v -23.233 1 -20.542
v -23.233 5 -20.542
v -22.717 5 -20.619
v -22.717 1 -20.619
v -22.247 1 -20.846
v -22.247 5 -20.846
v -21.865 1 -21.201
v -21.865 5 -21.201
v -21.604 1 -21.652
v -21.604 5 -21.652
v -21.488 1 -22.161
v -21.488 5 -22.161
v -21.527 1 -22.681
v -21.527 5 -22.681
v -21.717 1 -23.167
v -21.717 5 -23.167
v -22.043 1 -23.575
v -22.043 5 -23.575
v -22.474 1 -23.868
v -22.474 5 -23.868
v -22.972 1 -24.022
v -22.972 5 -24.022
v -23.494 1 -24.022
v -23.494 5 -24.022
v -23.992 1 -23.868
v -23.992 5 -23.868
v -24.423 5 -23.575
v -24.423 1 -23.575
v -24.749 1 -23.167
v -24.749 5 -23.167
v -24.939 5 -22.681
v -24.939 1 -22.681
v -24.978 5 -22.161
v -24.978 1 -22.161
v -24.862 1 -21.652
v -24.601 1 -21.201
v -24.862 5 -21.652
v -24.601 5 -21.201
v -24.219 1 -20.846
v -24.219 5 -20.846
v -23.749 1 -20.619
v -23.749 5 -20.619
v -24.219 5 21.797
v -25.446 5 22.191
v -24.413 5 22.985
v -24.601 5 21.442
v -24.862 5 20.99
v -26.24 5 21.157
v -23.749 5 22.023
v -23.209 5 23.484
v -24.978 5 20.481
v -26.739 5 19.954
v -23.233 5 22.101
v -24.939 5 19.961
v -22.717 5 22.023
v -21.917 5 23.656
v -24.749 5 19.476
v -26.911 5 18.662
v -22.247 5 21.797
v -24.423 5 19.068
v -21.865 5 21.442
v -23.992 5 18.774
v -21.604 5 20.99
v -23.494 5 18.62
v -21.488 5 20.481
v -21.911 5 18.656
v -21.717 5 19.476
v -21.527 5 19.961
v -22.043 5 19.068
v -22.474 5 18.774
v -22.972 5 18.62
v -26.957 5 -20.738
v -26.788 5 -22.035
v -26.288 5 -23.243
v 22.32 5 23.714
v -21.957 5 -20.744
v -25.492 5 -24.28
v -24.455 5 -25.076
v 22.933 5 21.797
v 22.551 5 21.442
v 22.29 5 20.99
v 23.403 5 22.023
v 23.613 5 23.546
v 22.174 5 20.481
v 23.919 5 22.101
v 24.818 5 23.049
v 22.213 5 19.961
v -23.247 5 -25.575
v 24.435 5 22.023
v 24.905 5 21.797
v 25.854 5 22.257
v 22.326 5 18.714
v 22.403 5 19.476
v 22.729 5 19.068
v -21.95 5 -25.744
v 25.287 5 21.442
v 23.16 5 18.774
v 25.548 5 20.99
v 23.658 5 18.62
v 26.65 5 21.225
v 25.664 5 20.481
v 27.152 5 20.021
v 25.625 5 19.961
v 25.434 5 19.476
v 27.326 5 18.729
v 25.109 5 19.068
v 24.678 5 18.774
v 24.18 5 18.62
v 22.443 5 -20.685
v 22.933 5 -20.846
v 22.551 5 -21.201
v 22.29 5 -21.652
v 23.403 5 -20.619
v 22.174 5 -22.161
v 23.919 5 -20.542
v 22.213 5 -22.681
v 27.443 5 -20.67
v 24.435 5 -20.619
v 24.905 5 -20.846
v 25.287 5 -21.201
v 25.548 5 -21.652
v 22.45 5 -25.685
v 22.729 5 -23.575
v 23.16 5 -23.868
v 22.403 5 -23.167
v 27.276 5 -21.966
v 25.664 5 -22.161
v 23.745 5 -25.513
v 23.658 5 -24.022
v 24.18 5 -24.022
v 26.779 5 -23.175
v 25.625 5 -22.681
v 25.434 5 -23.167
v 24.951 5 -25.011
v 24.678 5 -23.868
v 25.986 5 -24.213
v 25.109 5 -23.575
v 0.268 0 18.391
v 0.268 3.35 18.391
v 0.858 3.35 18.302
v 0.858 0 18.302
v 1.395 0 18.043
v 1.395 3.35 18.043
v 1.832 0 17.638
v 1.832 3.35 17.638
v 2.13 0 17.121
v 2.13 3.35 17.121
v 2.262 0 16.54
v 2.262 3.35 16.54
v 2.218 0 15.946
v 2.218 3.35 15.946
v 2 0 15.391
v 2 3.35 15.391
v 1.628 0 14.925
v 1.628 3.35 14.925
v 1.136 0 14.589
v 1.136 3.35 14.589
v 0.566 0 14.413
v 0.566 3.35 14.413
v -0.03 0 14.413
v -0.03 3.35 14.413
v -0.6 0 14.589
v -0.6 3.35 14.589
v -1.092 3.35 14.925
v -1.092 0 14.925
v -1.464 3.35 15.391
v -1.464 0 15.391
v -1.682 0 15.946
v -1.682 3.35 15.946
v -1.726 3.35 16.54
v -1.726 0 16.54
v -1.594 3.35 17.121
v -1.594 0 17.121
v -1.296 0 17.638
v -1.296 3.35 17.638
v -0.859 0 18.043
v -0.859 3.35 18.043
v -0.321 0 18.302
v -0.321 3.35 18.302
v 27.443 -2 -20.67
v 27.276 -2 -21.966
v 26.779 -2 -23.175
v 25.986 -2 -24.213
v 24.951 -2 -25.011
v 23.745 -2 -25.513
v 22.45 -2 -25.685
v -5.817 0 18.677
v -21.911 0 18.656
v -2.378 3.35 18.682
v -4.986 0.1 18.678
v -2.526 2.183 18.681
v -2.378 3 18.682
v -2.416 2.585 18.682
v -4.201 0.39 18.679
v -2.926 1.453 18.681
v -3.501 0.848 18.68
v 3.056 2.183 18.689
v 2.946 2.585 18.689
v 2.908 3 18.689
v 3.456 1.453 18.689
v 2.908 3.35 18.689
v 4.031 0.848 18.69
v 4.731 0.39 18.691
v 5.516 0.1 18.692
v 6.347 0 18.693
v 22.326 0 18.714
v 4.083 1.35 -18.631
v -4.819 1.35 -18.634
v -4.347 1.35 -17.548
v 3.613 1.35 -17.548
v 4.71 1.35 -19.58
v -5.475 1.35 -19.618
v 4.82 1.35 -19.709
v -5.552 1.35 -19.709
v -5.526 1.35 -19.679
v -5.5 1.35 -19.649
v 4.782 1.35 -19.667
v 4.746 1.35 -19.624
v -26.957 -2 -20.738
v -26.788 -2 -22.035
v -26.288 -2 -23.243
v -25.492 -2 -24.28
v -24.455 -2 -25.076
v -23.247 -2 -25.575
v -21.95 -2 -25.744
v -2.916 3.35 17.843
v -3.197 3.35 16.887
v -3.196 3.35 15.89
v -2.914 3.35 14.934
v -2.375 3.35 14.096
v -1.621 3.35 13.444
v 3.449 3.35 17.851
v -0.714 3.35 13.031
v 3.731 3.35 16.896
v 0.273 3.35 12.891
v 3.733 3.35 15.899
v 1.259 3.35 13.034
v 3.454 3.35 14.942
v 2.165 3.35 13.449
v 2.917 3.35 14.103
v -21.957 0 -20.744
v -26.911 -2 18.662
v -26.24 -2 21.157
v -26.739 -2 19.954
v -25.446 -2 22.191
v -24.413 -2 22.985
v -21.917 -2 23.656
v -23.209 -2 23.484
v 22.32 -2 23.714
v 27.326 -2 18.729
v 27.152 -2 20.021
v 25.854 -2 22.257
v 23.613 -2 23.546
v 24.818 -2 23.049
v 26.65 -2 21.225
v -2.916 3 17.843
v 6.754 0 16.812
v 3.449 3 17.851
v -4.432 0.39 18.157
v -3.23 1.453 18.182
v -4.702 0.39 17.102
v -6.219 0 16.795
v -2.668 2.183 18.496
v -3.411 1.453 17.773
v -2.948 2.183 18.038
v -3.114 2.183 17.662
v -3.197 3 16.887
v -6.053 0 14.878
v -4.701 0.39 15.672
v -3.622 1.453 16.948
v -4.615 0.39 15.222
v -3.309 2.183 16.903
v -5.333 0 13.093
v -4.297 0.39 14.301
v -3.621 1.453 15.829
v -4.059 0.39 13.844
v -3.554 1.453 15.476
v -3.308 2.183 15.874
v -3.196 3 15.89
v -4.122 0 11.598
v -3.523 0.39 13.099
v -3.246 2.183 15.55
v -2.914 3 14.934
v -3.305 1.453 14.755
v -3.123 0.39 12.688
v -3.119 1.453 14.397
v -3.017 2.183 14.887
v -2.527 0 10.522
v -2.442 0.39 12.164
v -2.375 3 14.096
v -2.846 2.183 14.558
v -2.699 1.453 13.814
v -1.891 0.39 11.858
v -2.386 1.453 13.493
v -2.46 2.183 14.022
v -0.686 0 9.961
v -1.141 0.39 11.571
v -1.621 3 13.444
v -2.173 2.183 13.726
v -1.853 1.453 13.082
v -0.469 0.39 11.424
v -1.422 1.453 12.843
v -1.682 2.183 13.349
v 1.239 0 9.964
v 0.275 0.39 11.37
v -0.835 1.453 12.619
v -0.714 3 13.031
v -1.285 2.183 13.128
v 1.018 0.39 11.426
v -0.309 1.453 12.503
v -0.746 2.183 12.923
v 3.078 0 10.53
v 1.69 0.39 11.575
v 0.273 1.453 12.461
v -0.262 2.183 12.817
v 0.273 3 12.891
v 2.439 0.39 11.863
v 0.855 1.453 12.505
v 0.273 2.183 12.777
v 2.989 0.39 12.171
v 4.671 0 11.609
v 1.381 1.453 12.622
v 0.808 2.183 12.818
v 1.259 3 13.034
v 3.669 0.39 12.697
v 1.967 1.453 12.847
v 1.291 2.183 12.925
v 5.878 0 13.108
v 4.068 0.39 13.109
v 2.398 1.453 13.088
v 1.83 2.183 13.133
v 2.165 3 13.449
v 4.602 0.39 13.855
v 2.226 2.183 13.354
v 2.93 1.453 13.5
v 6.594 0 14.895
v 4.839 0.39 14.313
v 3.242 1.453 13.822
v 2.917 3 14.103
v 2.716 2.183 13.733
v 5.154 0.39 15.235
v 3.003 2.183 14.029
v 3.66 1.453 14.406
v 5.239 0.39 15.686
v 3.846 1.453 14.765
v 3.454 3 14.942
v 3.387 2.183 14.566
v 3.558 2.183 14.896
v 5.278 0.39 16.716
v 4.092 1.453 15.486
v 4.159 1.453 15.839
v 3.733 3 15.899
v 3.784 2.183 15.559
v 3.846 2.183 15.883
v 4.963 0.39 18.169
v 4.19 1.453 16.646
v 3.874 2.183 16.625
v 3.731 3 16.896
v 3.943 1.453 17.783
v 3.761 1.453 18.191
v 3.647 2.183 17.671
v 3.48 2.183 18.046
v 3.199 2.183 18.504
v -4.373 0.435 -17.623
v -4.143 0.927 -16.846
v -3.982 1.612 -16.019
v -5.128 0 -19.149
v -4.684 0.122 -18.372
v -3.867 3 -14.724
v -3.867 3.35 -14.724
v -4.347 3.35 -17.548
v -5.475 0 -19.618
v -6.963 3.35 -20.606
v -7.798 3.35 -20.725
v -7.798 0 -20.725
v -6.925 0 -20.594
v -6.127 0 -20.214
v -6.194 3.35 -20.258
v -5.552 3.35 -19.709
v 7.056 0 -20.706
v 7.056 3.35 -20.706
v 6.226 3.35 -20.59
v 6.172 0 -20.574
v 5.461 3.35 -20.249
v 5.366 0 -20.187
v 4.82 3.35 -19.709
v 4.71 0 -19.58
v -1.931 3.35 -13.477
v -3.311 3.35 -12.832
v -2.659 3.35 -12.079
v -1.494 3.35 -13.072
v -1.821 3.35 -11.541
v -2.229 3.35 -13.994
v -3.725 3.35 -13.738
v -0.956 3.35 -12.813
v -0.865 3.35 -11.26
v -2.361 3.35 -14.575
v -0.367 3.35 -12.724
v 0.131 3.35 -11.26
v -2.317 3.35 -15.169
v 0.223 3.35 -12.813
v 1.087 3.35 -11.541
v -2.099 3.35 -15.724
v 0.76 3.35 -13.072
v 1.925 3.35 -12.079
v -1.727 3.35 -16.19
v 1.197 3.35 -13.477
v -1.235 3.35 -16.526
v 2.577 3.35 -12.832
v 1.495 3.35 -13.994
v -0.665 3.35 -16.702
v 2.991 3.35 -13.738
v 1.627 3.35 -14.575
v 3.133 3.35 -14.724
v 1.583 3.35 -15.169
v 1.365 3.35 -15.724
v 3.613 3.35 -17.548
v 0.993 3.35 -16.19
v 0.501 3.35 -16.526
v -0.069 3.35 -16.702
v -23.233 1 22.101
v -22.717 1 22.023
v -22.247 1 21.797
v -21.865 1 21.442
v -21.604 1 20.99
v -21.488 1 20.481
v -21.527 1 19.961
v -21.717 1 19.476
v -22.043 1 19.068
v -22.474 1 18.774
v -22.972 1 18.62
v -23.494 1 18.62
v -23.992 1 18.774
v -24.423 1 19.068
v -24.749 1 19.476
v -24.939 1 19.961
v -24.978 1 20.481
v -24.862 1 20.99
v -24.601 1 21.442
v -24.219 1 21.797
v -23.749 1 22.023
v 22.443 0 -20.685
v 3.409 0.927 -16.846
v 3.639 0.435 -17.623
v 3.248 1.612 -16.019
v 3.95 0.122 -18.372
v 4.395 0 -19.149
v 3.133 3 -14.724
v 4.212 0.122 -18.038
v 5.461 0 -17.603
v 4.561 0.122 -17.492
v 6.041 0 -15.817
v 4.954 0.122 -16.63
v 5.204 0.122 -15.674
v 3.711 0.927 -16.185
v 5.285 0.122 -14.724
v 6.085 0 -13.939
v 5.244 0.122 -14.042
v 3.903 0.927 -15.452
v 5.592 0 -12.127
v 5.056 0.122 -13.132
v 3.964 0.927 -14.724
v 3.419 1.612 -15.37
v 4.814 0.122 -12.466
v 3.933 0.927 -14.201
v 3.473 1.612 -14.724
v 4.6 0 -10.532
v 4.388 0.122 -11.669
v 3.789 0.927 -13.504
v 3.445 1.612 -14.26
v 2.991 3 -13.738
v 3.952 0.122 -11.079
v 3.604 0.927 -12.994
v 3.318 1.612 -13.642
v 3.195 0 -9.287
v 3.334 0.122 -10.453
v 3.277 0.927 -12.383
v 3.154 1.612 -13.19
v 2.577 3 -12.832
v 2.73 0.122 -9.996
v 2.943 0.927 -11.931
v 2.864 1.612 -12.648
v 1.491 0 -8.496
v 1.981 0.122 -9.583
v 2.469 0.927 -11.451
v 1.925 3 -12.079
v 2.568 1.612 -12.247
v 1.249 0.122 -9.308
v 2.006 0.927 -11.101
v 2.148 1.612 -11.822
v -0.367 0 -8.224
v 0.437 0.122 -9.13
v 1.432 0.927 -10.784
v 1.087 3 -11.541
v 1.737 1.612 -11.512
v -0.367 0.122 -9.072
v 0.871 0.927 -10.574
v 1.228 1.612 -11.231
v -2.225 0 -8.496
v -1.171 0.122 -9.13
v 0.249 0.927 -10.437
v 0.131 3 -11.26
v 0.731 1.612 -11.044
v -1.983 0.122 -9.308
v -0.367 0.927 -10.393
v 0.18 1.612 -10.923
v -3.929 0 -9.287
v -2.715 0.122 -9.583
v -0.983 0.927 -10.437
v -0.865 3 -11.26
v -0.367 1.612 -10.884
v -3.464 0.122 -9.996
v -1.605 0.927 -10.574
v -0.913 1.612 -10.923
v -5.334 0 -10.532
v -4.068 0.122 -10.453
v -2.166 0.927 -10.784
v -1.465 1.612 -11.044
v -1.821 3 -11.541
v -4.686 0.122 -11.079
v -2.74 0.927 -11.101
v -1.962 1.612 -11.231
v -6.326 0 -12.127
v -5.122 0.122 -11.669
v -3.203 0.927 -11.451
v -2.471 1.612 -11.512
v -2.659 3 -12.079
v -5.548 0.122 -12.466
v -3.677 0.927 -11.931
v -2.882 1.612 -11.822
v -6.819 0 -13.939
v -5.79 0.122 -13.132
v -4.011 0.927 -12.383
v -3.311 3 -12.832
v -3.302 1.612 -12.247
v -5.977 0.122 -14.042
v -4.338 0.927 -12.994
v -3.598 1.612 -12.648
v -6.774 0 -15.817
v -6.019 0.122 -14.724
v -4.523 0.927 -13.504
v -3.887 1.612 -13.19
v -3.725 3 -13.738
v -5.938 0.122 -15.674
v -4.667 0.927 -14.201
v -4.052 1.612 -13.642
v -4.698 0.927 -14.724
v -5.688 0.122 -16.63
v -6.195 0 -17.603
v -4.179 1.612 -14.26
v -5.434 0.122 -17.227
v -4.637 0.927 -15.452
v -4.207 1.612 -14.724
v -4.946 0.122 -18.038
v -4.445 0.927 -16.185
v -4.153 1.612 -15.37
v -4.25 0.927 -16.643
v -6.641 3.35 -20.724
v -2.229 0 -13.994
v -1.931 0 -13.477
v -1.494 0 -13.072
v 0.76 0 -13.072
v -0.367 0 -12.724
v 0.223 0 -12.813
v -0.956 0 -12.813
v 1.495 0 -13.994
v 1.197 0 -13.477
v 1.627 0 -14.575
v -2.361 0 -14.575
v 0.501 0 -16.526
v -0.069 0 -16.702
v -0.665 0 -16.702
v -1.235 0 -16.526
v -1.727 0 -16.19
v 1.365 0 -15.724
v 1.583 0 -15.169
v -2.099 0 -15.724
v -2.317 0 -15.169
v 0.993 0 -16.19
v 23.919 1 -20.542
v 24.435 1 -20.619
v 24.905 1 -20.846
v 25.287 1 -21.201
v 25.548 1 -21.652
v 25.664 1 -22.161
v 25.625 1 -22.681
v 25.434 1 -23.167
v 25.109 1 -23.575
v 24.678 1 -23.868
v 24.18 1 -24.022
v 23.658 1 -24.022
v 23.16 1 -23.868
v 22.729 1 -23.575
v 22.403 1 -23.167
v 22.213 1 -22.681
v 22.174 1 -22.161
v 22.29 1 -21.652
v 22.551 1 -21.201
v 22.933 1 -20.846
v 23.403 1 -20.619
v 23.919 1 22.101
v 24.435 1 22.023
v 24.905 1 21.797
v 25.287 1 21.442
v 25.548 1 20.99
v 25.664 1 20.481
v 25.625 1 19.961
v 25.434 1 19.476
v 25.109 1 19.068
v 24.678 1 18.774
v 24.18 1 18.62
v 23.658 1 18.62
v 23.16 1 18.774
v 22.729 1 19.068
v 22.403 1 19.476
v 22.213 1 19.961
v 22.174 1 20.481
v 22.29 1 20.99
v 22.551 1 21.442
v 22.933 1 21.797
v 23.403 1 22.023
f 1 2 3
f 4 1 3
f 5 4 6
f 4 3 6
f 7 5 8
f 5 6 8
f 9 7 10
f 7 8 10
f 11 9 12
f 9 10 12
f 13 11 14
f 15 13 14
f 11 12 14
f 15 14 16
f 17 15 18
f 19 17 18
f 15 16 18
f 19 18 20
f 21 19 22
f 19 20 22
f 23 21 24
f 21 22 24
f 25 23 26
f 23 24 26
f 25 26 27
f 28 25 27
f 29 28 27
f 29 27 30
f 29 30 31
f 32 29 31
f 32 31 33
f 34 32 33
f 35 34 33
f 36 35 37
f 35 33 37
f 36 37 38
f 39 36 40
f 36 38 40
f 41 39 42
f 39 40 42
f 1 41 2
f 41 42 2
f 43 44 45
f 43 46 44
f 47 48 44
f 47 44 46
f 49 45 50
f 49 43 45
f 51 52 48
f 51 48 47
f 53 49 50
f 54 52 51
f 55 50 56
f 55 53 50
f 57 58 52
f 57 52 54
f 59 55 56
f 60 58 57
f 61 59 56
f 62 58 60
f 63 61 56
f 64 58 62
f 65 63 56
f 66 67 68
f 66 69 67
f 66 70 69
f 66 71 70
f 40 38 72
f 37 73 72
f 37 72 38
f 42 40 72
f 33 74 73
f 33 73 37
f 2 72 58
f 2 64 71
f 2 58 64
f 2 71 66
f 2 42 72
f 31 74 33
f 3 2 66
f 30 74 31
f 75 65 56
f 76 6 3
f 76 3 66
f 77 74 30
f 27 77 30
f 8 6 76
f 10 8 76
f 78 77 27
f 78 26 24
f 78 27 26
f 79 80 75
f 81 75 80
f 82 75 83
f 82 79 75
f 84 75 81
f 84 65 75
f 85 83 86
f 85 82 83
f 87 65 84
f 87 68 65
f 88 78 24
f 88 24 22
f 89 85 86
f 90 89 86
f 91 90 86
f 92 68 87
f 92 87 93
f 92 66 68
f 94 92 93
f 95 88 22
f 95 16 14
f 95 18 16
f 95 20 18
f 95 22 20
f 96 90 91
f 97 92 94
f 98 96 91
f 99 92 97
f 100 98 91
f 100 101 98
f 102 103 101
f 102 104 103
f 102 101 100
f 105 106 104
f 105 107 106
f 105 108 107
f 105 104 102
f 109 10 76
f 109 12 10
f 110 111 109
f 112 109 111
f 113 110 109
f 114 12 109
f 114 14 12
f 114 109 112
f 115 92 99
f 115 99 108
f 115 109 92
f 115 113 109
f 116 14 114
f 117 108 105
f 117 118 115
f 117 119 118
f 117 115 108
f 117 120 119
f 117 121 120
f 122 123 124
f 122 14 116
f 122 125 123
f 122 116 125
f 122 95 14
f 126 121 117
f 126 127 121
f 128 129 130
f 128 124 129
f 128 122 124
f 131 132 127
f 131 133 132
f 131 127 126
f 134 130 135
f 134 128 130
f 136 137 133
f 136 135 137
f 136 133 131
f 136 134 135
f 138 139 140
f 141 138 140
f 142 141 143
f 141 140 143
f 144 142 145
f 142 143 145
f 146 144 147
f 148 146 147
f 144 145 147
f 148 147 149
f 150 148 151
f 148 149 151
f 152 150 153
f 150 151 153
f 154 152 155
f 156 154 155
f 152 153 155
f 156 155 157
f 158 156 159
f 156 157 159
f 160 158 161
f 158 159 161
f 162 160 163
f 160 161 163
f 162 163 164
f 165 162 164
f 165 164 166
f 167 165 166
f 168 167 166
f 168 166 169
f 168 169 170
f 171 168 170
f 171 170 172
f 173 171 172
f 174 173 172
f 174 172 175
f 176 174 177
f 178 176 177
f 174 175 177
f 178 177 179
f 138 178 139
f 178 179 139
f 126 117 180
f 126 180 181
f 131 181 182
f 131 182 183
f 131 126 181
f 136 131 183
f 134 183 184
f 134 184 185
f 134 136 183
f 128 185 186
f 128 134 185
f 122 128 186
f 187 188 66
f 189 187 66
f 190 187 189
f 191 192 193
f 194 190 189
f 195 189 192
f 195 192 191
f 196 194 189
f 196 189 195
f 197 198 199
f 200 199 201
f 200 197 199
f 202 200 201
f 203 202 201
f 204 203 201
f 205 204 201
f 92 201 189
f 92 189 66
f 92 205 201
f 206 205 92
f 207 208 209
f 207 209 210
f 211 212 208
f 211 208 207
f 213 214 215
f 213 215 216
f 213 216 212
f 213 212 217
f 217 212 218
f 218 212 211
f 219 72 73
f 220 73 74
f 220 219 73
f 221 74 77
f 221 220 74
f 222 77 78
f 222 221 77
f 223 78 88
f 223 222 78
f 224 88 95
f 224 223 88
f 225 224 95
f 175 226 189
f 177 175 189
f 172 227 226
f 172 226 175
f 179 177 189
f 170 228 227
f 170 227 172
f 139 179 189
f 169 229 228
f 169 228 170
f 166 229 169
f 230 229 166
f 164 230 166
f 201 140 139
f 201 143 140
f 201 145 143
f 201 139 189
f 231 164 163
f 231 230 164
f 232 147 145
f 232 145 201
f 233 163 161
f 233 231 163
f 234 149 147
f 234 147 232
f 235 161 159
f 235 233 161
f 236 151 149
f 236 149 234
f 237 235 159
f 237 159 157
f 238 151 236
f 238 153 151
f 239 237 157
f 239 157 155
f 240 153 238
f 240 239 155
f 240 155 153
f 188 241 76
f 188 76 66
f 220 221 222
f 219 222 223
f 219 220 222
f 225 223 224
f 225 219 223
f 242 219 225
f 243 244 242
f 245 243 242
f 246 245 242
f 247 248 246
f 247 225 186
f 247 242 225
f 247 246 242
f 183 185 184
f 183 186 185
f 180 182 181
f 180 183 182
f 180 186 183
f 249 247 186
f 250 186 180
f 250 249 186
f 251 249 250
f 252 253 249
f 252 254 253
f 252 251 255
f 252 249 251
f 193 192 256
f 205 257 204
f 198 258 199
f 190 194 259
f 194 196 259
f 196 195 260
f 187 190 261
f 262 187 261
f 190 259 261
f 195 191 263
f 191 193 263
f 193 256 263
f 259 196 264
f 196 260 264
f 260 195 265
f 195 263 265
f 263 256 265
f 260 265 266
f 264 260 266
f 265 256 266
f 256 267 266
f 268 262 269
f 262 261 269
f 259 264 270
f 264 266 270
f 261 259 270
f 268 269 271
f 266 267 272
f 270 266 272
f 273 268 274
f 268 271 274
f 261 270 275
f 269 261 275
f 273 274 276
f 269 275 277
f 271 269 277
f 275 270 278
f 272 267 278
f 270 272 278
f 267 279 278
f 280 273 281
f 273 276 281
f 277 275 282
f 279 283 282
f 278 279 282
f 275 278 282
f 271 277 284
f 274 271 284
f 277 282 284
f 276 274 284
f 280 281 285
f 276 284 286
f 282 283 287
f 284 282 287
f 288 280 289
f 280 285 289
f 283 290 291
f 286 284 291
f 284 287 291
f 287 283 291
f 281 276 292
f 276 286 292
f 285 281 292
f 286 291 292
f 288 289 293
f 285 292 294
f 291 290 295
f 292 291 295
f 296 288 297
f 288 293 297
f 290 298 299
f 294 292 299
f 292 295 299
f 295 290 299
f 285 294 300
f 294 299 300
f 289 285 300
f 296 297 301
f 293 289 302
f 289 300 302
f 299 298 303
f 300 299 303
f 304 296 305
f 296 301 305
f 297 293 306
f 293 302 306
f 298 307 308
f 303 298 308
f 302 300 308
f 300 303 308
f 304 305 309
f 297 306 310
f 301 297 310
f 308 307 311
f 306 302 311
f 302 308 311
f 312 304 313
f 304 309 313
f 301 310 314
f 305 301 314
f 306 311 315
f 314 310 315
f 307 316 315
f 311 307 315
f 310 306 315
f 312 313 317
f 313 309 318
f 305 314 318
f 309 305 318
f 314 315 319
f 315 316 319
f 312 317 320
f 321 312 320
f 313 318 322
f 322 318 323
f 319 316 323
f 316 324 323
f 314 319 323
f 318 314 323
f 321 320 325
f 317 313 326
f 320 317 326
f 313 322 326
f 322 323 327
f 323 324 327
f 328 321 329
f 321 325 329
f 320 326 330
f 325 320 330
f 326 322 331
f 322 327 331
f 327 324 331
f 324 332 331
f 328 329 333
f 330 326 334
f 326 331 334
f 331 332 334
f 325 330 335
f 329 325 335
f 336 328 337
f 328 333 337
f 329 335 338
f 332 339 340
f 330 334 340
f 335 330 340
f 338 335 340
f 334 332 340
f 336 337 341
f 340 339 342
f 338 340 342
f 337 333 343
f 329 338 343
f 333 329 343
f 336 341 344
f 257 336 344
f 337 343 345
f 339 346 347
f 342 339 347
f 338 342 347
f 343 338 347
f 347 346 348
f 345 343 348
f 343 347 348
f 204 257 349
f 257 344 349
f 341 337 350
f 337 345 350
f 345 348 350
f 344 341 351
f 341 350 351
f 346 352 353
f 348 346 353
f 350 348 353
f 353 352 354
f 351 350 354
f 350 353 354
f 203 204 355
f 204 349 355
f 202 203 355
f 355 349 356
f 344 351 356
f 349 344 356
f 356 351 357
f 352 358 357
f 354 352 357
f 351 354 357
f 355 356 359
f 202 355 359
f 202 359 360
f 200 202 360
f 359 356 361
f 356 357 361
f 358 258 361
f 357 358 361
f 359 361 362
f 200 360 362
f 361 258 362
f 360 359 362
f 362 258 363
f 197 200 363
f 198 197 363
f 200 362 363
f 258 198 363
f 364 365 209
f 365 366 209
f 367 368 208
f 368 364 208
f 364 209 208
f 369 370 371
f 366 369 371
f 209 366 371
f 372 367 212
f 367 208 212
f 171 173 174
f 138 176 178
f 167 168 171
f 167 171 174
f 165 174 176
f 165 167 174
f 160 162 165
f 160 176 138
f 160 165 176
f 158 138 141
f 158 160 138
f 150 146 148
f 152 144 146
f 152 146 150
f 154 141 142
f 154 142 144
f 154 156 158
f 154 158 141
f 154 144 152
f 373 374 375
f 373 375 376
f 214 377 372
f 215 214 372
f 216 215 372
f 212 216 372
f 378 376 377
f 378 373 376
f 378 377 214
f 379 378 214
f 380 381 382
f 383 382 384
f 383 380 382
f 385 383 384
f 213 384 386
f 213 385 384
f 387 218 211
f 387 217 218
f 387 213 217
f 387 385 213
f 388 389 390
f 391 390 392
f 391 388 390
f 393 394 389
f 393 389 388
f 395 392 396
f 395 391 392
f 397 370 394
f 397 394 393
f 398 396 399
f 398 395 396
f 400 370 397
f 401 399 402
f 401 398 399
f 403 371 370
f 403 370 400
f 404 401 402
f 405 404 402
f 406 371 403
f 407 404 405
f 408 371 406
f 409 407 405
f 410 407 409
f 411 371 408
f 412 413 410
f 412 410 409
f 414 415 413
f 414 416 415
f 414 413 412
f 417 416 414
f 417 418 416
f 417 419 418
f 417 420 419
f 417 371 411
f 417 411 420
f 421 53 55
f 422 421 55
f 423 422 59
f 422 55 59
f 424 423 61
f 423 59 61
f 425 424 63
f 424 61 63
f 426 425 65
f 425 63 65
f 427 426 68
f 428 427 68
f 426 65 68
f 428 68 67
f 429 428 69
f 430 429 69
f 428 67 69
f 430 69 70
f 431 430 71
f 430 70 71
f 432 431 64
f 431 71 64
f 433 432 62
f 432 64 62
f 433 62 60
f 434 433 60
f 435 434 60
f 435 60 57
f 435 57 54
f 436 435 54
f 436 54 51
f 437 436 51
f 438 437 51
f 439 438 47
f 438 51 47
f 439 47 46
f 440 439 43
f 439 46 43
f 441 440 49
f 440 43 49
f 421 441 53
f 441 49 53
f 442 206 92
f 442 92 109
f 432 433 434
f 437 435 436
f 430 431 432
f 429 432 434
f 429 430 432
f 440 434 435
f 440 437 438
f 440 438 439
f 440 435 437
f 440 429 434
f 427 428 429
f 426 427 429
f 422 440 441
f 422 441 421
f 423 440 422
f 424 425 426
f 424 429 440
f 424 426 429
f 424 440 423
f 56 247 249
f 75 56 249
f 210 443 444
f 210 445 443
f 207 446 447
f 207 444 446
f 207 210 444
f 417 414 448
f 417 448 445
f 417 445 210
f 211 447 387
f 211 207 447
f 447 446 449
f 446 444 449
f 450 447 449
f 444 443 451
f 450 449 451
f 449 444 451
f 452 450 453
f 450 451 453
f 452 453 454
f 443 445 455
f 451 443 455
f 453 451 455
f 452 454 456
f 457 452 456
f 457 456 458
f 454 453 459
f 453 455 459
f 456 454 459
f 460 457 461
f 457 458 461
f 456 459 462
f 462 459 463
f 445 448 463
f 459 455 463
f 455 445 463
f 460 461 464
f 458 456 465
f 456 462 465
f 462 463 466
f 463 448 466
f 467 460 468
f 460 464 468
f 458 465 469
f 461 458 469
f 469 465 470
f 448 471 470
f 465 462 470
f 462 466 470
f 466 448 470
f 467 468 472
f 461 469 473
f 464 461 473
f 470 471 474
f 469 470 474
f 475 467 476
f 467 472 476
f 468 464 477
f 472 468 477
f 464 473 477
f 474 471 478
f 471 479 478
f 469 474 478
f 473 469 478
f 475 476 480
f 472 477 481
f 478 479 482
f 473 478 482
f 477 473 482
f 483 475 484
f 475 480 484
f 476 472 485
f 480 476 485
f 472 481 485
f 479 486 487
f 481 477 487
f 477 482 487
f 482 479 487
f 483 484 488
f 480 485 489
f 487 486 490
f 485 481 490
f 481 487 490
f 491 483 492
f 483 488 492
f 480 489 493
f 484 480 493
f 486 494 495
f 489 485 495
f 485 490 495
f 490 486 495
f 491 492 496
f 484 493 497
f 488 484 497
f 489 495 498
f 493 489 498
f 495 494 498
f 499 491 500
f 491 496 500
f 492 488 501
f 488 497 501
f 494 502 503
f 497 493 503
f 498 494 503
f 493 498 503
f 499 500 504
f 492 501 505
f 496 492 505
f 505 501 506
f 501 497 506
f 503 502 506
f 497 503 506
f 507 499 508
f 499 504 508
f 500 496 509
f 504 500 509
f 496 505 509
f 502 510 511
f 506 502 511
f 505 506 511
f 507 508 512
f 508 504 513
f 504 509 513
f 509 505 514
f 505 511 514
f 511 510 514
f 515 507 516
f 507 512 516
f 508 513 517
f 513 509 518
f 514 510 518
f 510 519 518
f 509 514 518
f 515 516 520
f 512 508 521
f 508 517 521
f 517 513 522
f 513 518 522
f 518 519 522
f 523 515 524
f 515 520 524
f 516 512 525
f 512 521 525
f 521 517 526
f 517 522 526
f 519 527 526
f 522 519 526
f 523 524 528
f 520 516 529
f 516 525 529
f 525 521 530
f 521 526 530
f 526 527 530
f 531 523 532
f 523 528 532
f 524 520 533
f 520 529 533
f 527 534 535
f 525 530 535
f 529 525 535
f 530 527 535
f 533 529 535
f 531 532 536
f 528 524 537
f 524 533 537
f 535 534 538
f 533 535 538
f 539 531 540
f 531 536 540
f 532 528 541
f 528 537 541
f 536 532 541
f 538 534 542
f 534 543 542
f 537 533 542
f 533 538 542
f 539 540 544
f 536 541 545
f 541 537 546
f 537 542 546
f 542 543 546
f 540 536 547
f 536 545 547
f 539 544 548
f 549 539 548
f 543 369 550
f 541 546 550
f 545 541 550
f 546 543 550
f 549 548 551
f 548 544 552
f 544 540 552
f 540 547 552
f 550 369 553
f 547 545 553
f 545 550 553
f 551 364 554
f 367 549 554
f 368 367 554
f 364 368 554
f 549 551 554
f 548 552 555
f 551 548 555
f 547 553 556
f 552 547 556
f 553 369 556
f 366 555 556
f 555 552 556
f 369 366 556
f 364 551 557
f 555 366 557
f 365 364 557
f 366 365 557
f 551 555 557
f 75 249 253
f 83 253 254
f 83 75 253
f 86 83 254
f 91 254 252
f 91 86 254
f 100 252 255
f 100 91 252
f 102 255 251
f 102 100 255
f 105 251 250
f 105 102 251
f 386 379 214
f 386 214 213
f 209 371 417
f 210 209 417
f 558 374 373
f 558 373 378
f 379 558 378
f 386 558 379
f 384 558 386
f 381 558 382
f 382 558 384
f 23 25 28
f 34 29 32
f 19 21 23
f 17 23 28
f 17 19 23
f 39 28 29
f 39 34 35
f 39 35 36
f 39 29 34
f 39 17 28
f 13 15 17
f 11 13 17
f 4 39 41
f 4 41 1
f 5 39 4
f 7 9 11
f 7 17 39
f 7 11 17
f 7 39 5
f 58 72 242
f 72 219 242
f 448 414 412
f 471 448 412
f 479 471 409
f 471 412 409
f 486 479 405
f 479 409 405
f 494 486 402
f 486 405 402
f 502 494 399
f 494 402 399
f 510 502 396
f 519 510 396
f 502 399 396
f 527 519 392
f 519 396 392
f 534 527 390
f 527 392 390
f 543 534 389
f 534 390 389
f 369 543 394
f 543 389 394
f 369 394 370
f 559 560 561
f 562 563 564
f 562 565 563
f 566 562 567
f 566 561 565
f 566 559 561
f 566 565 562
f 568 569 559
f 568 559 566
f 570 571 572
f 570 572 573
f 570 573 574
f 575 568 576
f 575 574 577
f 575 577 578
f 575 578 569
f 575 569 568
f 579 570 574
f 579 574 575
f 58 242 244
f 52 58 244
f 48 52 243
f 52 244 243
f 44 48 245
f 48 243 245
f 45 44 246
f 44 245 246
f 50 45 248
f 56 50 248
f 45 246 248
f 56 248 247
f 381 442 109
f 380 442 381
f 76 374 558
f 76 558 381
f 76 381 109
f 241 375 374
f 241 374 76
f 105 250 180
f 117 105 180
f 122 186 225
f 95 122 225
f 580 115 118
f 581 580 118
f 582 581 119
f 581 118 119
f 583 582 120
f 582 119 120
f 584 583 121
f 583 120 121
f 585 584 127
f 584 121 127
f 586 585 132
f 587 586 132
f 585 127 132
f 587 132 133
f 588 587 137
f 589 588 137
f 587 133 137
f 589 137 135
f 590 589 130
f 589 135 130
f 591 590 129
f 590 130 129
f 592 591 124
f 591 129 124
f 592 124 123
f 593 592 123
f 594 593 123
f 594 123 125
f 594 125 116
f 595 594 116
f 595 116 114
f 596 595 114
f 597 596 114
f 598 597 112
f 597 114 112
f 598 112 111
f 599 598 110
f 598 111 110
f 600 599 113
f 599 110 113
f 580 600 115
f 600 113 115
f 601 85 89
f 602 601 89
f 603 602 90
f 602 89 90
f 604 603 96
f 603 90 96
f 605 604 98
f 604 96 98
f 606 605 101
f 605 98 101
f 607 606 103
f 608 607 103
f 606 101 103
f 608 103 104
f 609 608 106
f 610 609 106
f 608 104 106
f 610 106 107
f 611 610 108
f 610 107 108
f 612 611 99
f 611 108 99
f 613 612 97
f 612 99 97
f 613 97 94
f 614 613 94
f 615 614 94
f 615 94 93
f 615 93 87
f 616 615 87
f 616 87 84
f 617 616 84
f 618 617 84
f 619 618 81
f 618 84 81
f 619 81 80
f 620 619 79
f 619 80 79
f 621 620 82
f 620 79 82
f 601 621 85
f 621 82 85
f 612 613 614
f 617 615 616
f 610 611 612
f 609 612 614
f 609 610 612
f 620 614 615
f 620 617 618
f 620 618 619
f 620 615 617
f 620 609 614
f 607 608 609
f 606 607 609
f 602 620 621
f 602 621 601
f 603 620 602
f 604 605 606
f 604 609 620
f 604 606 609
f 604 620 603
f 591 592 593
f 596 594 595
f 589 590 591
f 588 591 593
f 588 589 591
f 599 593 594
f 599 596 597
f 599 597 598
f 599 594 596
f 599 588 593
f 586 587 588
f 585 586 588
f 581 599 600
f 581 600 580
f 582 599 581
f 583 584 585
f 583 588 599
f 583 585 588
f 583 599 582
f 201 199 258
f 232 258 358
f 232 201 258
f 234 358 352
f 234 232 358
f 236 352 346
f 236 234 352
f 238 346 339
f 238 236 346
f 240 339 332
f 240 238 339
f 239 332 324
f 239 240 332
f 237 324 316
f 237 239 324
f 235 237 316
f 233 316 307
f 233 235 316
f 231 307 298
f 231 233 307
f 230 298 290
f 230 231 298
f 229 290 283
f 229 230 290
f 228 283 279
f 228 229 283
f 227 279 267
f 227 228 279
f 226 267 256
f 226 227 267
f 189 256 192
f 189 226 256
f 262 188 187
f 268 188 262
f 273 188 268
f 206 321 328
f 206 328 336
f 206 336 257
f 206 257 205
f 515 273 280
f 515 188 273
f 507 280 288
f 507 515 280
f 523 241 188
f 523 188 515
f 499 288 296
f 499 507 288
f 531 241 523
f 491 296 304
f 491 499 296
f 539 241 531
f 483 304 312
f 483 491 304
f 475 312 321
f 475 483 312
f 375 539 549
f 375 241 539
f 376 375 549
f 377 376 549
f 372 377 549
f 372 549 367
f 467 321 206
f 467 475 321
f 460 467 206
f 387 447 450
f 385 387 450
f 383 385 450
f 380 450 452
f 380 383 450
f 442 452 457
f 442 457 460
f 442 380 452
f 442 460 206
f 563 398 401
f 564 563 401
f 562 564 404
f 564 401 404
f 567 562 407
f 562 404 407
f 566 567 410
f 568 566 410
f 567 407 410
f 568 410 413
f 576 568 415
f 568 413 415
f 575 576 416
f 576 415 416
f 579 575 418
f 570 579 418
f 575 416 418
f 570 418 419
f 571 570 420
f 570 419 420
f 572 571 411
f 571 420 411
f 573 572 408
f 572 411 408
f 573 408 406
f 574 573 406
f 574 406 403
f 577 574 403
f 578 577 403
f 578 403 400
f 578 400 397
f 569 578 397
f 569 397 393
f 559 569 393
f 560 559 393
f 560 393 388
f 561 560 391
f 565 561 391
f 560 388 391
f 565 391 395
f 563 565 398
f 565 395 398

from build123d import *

# Parameters (mm, degrees)
CROQUIS1_R              = 1.3
SALIENTE_EXTRUIR1_DEPTH = 5
VACIADO1_START          = -5
VACIADO1_DEPTH          = 5
VACIADO1_2_OUTLINE_R    = 1.3
VACIADO1_2_DEPTH        = 5
VACIADO1_3_OUTLINE_R    = 1.3
VACIADO1_3_DEPTH        = 5
SALIENTE_EXTRUIR2_START = -1.65
CROQUIS2_R              = 3.5
CROQUIS2_R_2            = 2
SALIENTE_EXTRUIR2_DEPTH = 3.35
CROQUIS3_R              = 2
CORTAR_EXTRUIR1_DEPTH   = 5
REDONDEO1_R             = 5
CROQUIS4_R              = 1.75
CORTAR_EXTRUIR2_DEPTH   = 4
REDONDEO2_R             = 3
CROQUIS5_W              = 10.71017297
CROQUIS5_H              = 2.16113269
CORTAR_EXTRUIR3_DEPTH   = 2
REDONDEO3_R             = 5
CROQUIS6_W              = 134.393326308
CROQUIS6_H              = 117.100902836
CORTAR_EXTRUIR4_DEPTH   = 3


# Read off the part's stored shape, not the designer's step: Vaciado1
with BuildPart() as part:
    # Croquis1 → Saliente-Extruir1 (new body)
    with BuildSketch(Plane(origin=(0, 0, 0), x_dir=(1, 0, 0), z_dir=(0, 1, 0))):
        Polygon((-21.910650365, -18.655769069), (22.326249635, -18.714369069), (22.443043136, 20.685314639), (-21.956956864, 20.744230931), align=None)
        with Locations(Location((0.268043136, -16.390769069, 0), (0, 0, 270))):
            Circle(CROQUIS1_R, mode=Mode.SUBTRACT)
        with Locations(Location((-0.366956864, 14.724230931, 0), (0, 0, 270))):
            Circle(CROQUIS1_R, mode=Mode.SUBTRACT)
    extrude(amount=SALIENTE_EXTRUIR1_DEPTH)

    # Vaciado1 outline → Vaciado1 (add)
    with BuildSketch(Plane(origin=(0, 0, 0), x_dir=(1, 0, 0), z_dir=(0, 1, 0)).offset(VACIADO1_START)):
        Polygon((-26.904785129, -23.649157796), (27.311430385, -23.720977255), (27.457867021, 25.678664653), (-26.962844589, 25.750877863), align=None)
    extrude(amount=VACIADO1_DEPTH)

    # Vaciado1 2 outline → Vaciado1 2 (add)
    # profile 1 of 3: a face of its own
    with BuildSketch(Plane(origin=(0, 0, 0), x_dir=(1, 0, 0), z_dir=(0, 1, 0))):
        Polygon((-26.904785129, -23.649157796), (27.311430385, -23.720977255), (27.457867021, 25.678664653), (-26.962844589, 25.750877863), align=None)
        Polygon((22.443043136, 20.685314639), (22.326249635, -18.714369069), (-21.910650365, -18.655769069), (-21.956956864, 20.744230931), align=None, mode=Mode.SUBTRACT)
    # profile 2 of 3: a face of its own
    with BuildSketch(Plane(origin=(0, 0, 0), x_dir=(1, 0, 0), z_dir=(0, 1, 0))):
        with Locations((0.268043136, -16.390769069)):
            Circle(VACIADO1_2_OUTLINE_R)
    # profile 3 of 3: a face of its own
    with BuildSketch(Plane(origin=(0, 0, 0), x_dir=(1, 0, 0), z_dir=(0, 1, 0))):
        with Locations((-0.366956864, 14.724230931)):
            Circle(VACIADO1_2_OUTLINE_R)
    extrude(amount=VACIADO1_2_DEPTH)

    # Vaciado1 3 outline → Vaciado1 3 (cut)
    with BuildSketch(Plane(origin=(0, 0, 0), x_dir=(1, 0, 0), z_dir=(0, 1, 0))):
        Polygon((-21.910650365, -18.655769069), (22.326249635, -18.714369069), (22.443043136, 20.685314639), (-21.956956864, 20.744230931), align=None)
        with Locations((0.268043136, -16.390769069)):
            Circle(VACIADO1_3_OUTLINE_R, mode=Mode.SUBTRACT)
        with Locations((-0.366956864, 14.724230931)):
            Circle(VACIADO1_3_OUTLINE_R, mode=Mode.SUBTRACT)
    extrude(amount=VACIADO1_3_DEPTH, mode=Mode.SUBTRACT)

    # Croquis2 → Saliente-Extruir2 (add)
    # profile 1 of 2: a face of its own
    with BuildSketch(Plane(origin=(0, 5, 0), x_dir=(1, 0, 0), z_dir=(0, 1, 0)).offset(SALIENTE_EXTRUIR2_START)):
        with Locations((0.268043136, -16.390769069)):
            Circle(CROQUIS2_R)
        with Locations(Location((0.268043136, -16.390769069, 0), (0, 0, 270))):
            Circle(CROQUIS2_R_2, mode=Mode.SUBTRACT)
    # profile 2 of 2: a face of its own
    with BuildSketch(Plane(origin=(0, 5, 0), x_dir=(1, 0, 0), z_dir=(0, 1, 0)).offset(SALIENTE_EXTRUIR2_START)):
        with BuildLine():
            Line((-6.64056044, 20.723906938), (5.906646712, 20.723906938))
            add(Edge.make_bspline(
                [(3.133043136, 14.724230931), (3.271851145, 18.789959359), (5.906646712, 20.723906938)],
                knots=[0, 0, 0, 0.918206359, 0.918206359, 0.918206359], degree=2))
            ThreePointArc((3.133043136, 14.724230931), (-0.366956864, 11.224230931), (-3.866956864, 14.724230931))
            add(Edge.make_bspline(
                [(-3.866956864, 14.724230931), (-4.005764873, 18.789959359), (-6.64056044, 20.723906938)],
                knots=[0, 0, 0, 0.918206359, 0.918206359, 0.918206359], degree=2))
        make_face()
        with Locations(Location((-0.366956864, 14.724230931, 0), (0, 0, 270))):
            Circle(CROQUIS2_R_2, mode=Mode.SUBTRACT)
    extrude(amount=-SALIENTE_EXTRUIR2_DEPTH)

    # Croquis3 → Cortar-Extruir1 (cut)
    with BuildSketch(Plane(origin=(0, 5, 0), x_dir=(1, 0, 0), z_dir=(0, 1, 0))):
        with Locations(Location((-0.366956864, 14.724230931, 0), (0, 0, 270))):
            Circle(CROQUIS3_R)
        with Locations(Location((0.268043136, -16.390769069, 0), (0, 0, 270))):
            Circle(CROQUIS3_R)
    extrude(amount=-CORTAR_EXTRUIR1_DEPTH, mode=Mode.SUBTRACT)

    # Redondeo1
    redondeo1_edges = [part.edges().sort_by_distance(p)[0] for p in [
        (-26.962844589, 0, -25.750877863),
        (27.457867021, 0, -25.678664653),
    ]]
    fillet(redondeo1_edges, radius=REDONDEO1_R)

    # Croquis4 → Cortar-Extruir2 (cut)
    with BuildSketch(Plane(origin=(0, 5, 0), x_dir=(1, 0, 0), z_dir=(0, 1, 0))):
        with Locations(Location((-23.233010561, -20.350621098, 0), (0, 0, 270))):
            Circle(CROQUIS4_R)
        with Locations(Location((23.918815335, -20.350621098, 0), (0, 0, 270))):
            Circle(CROQUIS4_R)
        with Locations(Location((23.918815335, 22.291734245, 0), (0, 0, 270))):
            Circle(CROQUIS4_R)
        with Locations(Location((-23.233010561, 22.291734245, 0), (0, 0, 270))):
            Circle(CROQUIS4_R)
    extrude(amount=-CORTAR_EXTRUIR2_DEPTH, mode=Mode.SUBTRACT)

    # Redondeo2
    # the kernel refuses this fillet: 3 mm, written as the material it adds along each edge
    with BuildSketch(Plane(origin=(0.268043136, 0, 16.390769069), x_dir=(-0.004466262982364763, 0, 0.9999900261977478), z_dir=(0.9999900261977478, 0, 0.004466262982364763))) as redondeo2_piece_1_section:
        with BuildLine():
            CenterArc((3.5 + REDONDEO2_R, -REDONDEO2_R), REDONDEO2_R, 90, 90)
            Line((3.5, -REDONDEO2_R), (3.5 - REDONDEO2_R * 0.02, -REDONDEO2_R))
            Line((3.5 - REDONDEO2_R * 0.02, -REDONDEO2_R), (3.5 - REDONDEO2_R * 0.02, REDONDEO2_R * 0.02))
            Line((3.5 - REDONDEO2_R * 0.02, REDONDEO2_R * 0.02), (3.5 + REDONDEO2_R, REDONDEO2_R * 0.02))
            Line((3.5 + REDONDEO2_R, REDONDEO2_R * 0.02), (3.5 + REDONDEO2_R, 0))
        make_face()
    redondeo2_piece_1 = revolve(axis=Axis((0.268043136, 0, 16.390769069), (0, -1, 0)), revolution_arc=359.64, mode=Mode.PRIVATE)
    redondeo2_piece_1 = split(redondeo2_piece_1, bisect_by=Plane(origin=(0.265003809, 0.854230432, 18.685144847), z_dir=(0.0013246847899521655, 0, -0.9999991226047188)), keep=Keep.TOP, mode=Mode.PRIVATE)
    add(redondeo2_piece_1)
    with BuildSketch(Plane(origin=(-0.366956864, 0, -14.724230931), x_dir=(0.003141587485879655, 0, -0.9999950652018582), z_dir=(-0.9999950652018582, 0, -0.003141587485879655))) as redondeo2_piece_2:
        with BuildLine():
            CenterArc((3.5 + REDONDEO2_R, -REDONDEO2_R), REDONDEO2_R, 90, 90)
            Line((3.5, -REDONDEO2_R), (3.5 - REDONDEO2_R * 0.02, -REDONDEO2_R))
            Line((3.5 - REDONDEO2_R * 0.02, -REDONDEO2_R), (3.5 - REDONDEO2_R * 0.02, REDONDEO2_R * 0.02))
            Line((3.5 - REDONDEO2_R * 0.02, REDONDEO2_R * 0.02), (3.5 + REDONDEO2_R, REDONDEO2_R * 0.02))
            Line((3.5 + REDONDEO2_R, REDONDEO2_R * 0.02), (3.5 + REDONDEO2_R, 0))
        make_face()
    revolve(axis=Axis((-0.366956864, 0, -14.724230931), (0, -1, 0)), revolution_arc=359.64)
    with BuildSketch(Plane(origin=(5.884103635, 0, -20.707287416), x_dir=(0.9999991196116186, -2.6407019803235333e-15, 0.001326942345288348), z_dir=(0, 1, 0))) as redondeo2_piece_3:
        with BuildLine():
            CenterArc((1.172300158, -3), REDONDEO2_R, 90, 51.414502479)
            Line((-1.172734926, -1.128954716), (-1.219635628, -1.09153381))
            ThreePointArc((-1.219635628, -1.09153381), (-0.664607818, -0.483065198), (-0.035769429, 0.048172066))
            Line((-0.035769429, 0.048172066), (0, 0.06))
            Line((0, 0.06), (1.172300158, 0.06))
            Line((1.172300158, 0.06), (1.172300158, 0))
        make_face()
    extrude(amount=3.35)
    with BuildSketch(Plane(origin=(-6.64056044, 3.35, -20.723906938), x_dir=(-0.9999991196114262, 0, -0.0013269424902280428), z_dir=(0, -1, 0))) as redondeo2_piece_4:
        with BuildLine():
            CenterArc((1.1576947, -3), REDONDEO2_R, 89.999999992, 50.80553693)
            Line((-1.167321988, -1.104136767), (-1.213822322, -1.066219502))
            ThreePointArc((-1.213822322, -1.066219502), (-0.660180294, -0.471028769), (-0.035438663, 0.048415919))
            Line((-0.035438663, 0.048415919), (0, 0.06))
            Line((0, 0.06), (1.157694701, 0.06))
            Line((1.157694701, 0.06), (1.157694701, 0))
        make_face()
    extrude(amount=3.35)

    # Croquis5 → Cortar-Extruir3 (cut)
    with BuildSketch(Plane(origin=(0, 3.35, 0), x_dir=(1, 0, 0), z_dir=(0, 1, 0))):
        with Locations((-0.296000529, 18.628716842)):
            Rectangle(CROQUIS5_W, CROQUIS5_H)
    extrude(amount=-CORTAR_EXTRUIR3_DEPTH, mode=Mode.SUBTRACT)

    # Redondeo3
    redondeo3_edges = [part.edges().sort_by_distance(p)[0] for p in [
        (-26.904785129, 0, 23.649157796),
        (27.311430385, 0, 23.720977255),
    ]]
    fillet(redondeo3_edges, radius=REDONDEO3_R)

    # Croquis6 → Cortar-Extruir4 (cut)
    with BuildSketch(Plane.XZ.offset(5)):
        with Locations((-0.420435638, 0)):
            Rectangle(CROQUIS6_W, CROQUIS6_H)
    extrude(amount=-CORTAR_EXTRUIR4_DEPTH, mode=Mode.SUBTRACT)


solid = part.part
